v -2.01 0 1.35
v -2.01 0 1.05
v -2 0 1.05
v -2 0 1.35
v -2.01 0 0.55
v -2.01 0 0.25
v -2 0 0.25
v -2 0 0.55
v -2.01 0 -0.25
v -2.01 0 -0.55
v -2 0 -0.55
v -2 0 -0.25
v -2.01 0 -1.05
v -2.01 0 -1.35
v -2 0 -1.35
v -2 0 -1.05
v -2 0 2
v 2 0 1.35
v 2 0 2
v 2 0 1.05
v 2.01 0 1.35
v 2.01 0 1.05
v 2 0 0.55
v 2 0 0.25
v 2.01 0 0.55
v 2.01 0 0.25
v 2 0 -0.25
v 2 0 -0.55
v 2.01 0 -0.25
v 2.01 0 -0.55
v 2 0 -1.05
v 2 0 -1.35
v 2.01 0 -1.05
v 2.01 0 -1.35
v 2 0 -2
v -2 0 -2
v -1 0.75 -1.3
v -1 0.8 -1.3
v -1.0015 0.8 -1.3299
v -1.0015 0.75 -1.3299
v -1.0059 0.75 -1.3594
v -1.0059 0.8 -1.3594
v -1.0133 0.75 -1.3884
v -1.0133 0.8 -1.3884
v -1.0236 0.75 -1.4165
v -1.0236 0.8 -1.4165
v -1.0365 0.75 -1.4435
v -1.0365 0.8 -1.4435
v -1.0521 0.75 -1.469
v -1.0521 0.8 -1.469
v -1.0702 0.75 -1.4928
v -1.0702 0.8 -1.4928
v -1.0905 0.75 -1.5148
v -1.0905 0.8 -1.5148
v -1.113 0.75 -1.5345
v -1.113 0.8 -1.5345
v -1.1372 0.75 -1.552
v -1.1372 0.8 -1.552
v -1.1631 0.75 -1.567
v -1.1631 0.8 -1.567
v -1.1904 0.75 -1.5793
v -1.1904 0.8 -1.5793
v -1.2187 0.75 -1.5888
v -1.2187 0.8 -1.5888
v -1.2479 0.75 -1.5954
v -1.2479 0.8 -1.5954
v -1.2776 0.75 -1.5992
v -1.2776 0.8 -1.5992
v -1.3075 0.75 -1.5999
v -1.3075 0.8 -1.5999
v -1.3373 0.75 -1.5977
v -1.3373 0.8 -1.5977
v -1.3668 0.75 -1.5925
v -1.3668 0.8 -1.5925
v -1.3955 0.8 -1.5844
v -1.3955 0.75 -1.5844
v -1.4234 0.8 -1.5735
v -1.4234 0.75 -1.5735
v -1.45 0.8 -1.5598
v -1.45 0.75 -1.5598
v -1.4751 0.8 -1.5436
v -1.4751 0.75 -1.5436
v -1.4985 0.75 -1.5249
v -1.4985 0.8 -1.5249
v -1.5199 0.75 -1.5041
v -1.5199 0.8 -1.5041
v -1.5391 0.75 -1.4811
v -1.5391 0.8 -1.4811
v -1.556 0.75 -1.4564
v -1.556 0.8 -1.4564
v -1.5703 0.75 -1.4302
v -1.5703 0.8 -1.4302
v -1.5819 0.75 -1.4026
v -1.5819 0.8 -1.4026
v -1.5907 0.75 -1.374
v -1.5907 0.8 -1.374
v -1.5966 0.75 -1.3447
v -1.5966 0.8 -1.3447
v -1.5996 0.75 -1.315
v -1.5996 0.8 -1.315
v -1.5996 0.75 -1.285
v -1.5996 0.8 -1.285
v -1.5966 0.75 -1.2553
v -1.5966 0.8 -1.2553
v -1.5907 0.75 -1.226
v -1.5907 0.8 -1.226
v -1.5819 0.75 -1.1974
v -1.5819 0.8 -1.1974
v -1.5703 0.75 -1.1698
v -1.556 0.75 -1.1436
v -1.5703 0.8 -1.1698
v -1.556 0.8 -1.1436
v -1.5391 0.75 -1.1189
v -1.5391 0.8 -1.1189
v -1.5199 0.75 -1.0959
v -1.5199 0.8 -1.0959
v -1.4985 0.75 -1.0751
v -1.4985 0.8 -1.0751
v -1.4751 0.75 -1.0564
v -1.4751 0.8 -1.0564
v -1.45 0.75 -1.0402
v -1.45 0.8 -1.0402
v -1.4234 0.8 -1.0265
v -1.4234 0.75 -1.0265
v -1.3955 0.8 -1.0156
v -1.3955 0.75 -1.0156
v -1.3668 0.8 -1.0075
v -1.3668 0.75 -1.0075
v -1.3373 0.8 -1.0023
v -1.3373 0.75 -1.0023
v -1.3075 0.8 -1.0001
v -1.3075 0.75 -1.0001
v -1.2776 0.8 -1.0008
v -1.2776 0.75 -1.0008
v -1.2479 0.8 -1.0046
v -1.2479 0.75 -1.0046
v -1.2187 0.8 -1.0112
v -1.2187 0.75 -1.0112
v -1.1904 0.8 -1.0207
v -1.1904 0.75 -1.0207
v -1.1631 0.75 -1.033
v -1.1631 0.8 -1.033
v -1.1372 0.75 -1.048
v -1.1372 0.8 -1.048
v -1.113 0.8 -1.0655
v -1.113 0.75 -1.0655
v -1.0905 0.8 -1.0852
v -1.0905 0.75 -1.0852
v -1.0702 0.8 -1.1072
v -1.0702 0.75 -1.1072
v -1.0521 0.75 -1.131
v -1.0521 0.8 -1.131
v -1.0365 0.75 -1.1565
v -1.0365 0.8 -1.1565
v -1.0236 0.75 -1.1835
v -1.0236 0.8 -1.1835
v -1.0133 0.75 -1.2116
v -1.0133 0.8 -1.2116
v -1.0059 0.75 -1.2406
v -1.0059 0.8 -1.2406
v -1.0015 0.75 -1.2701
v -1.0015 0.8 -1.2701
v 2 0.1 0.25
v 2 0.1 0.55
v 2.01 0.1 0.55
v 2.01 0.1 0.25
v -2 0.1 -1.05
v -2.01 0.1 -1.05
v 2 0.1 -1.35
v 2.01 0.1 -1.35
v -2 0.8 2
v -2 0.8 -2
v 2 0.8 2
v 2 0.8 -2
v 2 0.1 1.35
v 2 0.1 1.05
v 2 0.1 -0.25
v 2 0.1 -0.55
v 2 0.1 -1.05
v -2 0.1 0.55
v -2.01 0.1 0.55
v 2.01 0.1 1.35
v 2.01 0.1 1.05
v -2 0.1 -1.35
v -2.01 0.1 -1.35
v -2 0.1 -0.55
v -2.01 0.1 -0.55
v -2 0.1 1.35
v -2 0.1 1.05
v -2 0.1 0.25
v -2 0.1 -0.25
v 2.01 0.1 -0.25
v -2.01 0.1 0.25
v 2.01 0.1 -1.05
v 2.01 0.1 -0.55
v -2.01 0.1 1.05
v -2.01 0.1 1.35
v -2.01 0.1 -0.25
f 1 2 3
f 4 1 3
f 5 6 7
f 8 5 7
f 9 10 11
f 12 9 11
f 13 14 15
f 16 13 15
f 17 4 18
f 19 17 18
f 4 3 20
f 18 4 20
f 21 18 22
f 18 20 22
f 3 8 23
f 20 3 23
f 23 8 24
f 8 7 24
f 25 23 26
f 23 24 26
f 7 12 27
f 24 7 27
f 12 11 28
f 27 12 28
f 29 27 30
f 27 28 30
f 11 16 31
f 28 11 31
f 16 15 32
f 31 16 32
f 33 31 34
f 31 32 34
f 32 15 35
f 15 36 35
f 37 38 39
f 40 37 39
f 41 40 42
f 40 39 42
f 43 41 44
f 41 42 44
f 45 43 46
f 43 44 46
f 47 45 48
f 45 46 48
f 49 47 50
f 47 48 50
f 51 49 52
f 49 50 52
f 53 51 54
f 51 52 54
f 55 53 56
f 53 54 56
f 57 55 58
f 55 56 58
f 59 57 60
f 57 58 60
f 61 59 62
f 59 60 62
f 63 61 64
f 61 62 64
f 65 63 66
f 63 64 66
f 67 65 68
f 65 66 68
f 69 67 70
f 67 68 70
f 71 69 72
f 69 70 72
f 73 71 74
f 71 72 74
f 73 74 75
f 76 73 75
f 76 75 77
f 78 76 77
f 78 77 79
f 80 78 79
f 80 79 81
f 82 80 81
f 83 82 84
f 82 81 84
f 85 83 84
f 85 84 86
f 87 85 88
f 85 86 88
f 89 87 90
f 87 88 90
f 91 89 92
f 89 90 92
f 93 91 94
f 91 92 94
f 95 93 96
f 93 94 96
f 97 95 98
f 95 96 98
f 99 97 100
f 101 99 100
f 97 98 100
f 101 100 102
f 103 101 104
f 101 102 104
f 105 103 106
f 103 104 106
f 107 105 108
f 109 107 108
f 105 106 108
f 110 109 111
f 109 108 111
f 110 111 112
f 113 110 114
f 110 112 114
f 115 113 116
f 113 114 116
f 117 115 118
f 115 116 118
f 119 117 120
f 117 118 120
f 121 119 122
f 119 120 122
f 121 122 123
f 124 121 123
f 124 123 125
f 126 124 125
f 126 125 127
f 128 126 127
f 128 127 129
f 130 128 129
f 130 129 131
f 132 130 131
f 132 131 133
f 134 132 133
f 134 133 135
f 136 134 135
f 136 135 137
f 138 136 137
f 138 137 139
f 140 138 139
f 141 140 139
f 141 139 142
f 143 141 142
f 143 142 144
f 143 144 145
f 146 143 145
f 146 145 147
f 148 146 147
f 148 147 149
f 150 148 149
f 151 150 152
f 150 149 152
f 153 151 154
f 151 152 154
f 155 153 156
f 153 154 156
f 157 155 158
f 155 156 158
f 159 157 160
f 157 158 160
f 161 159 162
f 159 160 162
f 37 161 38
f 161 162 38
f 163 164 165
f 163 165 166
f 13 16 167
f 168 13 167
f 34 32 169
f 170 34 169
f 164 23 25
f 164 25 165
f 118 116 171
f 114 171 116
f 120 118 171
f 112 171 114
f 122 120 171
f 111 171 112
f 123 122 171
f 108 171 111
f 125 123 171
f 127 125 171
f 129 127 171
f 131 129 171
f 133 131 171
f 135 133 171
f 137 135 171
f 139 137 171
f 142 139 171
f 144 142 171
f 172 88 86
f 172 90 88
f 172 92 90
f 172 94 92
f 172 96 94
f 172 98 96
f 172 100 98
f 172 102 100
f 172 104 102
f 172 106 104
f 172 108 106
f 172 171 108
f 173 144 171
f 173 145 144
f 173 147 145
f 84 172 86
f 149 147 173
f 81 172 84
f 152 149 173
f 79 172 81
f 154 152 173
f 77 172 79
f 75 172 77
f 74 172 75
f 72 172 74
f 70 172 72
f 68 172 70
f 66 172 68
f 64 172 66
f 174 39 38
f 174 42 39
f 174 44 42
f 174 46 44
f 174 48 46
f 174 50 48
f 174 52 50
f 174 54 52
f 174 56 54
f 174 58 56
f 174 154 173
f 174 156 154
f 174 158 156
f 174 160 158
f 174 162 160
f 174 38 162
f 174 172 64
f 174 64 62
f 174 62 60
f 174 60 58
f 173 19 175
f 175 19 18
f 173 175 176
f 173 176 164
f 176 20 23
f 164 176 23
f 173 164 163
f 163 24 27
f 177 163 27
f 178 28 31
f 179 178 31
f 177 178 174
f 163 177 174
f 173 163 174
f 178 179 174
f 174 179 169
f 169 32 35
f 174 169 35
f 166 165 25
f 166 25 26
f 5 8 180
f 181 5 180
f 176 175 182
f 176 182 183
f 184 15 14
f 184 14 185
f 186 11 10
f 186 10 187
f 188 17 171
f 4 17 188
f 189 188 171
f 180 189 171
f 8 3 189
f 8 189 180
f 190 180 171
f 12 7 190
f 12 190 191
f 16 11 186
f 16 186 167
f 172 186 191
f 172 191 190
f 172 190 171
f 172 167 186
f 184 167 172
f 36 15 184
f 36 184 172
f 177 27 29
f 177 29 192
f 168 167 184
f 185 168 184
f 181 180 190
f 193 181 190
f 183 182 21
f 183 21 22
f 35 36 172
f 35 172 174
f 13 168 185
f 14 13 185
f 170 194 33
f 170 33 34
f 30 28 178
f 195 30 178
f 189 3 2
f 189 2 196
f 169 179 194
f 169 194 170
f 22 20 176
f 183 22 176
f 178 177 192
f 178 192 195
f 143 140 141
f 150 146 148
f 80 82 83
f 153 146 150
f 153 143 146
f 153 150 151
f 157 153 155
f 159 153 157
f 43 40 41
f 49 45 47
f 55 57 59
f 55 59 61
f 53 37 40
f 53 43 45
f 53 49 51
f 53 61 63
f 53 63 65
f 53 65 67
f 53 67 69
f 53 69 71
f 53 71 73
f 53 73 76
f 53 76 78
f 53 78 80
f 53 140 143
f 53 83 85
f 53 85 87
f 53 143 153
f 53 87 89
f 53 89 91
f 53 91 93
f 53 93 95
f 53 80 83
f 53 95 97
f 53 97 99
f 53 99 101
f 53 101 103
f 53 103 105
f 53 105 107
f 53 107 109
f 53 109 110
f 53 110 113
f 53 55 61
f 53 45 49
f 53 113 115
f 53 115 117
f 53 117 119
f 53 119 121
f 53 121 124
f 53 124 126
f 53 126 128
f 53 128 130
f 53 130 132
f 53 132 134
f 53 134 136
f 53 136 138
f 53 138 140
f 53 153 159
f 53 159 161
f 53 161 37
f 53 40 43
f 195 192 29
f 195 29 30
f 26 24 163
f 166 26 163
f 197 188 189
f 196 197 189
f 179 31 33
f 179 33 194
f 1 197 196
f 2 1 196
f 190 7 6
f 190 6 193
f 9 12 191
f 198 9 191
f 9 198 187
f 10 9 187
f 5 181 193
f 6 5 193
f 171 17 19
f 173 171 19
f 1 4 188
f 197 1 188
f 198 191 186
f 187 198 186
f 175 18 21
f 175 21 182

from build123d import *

# Parameters (mm, degrees)
SKETCH1_W           = 4
SKETCH1_H           = 4
BOSS_EXTRUDE1_DEPTH = 0.8
SKETCH2_W           = 0.3
SKETCH2_H           = 0.1
BOSS_EXTRUDE2_DEPTH = 0.01
SKETCH3_R           = 0.3
CUT_EXTRUDE1_DEPTH  = 0.05


with BuildPart() as part:
    # Sketch1 → Boss-Extrude1 (new body)
    with BuildSketch(Plane(origin=(0, 0, 0), x_dir=(1, 0, 0), z_dir=(0, 1, 0))):
        Rectangle(SKETCH1_W, SKETCH1_H)
    extrude(amount=BOSS_EXTRUDE1_DEPTH)

    # Sketch2 → Boss-Extrude2 (add)
    with BuildSketch(Plane(origin=(2, 0, 0), x_dir=(0, 0, -1), z_dir=(1, 0, 0))):
        with Locations((-1.2, 0.05)):
            Rectangle(SKETCH2_W, SKETCH2_H)
        with Locations((-0.4, 0.05)):
            Rectangle(SKETCH2_W, SKETCH2_H)
        with Locations((0.4, 0.05)):
            Rectangle(SKETCH2_W, SKETCH2_H)
        with Locations((1.2, 0.05)):
            Rectangle(SKETCH2_W, SKETCH2_H)
    boss_extrude2 = extrude(amount=BOSS_EXTRUDE2_DEPTH)

    # Mirror1: Boss-Extrude2 across plane
    add(boss_extrude2.mirror(Plane(origin=(0, 0, 0), x_dir=(0, 0, 1), z_dir=(1, 0, 0))))

    # Sketch3 → Cut-Extrude1 (cut)
    with BuildSketch(Plane(origin=(0, 0.8, 0), x_dir=(1, 0, 0), z_dir=(0, 1, 0))):
        with Locations((-1.3, 1.3)):
            Circle(SKETCH3_R)
    extrude(amount=-CUT_EXTRUDE1_DEPTH, mode=Mode.SUBTRACT)


solid = part.part
